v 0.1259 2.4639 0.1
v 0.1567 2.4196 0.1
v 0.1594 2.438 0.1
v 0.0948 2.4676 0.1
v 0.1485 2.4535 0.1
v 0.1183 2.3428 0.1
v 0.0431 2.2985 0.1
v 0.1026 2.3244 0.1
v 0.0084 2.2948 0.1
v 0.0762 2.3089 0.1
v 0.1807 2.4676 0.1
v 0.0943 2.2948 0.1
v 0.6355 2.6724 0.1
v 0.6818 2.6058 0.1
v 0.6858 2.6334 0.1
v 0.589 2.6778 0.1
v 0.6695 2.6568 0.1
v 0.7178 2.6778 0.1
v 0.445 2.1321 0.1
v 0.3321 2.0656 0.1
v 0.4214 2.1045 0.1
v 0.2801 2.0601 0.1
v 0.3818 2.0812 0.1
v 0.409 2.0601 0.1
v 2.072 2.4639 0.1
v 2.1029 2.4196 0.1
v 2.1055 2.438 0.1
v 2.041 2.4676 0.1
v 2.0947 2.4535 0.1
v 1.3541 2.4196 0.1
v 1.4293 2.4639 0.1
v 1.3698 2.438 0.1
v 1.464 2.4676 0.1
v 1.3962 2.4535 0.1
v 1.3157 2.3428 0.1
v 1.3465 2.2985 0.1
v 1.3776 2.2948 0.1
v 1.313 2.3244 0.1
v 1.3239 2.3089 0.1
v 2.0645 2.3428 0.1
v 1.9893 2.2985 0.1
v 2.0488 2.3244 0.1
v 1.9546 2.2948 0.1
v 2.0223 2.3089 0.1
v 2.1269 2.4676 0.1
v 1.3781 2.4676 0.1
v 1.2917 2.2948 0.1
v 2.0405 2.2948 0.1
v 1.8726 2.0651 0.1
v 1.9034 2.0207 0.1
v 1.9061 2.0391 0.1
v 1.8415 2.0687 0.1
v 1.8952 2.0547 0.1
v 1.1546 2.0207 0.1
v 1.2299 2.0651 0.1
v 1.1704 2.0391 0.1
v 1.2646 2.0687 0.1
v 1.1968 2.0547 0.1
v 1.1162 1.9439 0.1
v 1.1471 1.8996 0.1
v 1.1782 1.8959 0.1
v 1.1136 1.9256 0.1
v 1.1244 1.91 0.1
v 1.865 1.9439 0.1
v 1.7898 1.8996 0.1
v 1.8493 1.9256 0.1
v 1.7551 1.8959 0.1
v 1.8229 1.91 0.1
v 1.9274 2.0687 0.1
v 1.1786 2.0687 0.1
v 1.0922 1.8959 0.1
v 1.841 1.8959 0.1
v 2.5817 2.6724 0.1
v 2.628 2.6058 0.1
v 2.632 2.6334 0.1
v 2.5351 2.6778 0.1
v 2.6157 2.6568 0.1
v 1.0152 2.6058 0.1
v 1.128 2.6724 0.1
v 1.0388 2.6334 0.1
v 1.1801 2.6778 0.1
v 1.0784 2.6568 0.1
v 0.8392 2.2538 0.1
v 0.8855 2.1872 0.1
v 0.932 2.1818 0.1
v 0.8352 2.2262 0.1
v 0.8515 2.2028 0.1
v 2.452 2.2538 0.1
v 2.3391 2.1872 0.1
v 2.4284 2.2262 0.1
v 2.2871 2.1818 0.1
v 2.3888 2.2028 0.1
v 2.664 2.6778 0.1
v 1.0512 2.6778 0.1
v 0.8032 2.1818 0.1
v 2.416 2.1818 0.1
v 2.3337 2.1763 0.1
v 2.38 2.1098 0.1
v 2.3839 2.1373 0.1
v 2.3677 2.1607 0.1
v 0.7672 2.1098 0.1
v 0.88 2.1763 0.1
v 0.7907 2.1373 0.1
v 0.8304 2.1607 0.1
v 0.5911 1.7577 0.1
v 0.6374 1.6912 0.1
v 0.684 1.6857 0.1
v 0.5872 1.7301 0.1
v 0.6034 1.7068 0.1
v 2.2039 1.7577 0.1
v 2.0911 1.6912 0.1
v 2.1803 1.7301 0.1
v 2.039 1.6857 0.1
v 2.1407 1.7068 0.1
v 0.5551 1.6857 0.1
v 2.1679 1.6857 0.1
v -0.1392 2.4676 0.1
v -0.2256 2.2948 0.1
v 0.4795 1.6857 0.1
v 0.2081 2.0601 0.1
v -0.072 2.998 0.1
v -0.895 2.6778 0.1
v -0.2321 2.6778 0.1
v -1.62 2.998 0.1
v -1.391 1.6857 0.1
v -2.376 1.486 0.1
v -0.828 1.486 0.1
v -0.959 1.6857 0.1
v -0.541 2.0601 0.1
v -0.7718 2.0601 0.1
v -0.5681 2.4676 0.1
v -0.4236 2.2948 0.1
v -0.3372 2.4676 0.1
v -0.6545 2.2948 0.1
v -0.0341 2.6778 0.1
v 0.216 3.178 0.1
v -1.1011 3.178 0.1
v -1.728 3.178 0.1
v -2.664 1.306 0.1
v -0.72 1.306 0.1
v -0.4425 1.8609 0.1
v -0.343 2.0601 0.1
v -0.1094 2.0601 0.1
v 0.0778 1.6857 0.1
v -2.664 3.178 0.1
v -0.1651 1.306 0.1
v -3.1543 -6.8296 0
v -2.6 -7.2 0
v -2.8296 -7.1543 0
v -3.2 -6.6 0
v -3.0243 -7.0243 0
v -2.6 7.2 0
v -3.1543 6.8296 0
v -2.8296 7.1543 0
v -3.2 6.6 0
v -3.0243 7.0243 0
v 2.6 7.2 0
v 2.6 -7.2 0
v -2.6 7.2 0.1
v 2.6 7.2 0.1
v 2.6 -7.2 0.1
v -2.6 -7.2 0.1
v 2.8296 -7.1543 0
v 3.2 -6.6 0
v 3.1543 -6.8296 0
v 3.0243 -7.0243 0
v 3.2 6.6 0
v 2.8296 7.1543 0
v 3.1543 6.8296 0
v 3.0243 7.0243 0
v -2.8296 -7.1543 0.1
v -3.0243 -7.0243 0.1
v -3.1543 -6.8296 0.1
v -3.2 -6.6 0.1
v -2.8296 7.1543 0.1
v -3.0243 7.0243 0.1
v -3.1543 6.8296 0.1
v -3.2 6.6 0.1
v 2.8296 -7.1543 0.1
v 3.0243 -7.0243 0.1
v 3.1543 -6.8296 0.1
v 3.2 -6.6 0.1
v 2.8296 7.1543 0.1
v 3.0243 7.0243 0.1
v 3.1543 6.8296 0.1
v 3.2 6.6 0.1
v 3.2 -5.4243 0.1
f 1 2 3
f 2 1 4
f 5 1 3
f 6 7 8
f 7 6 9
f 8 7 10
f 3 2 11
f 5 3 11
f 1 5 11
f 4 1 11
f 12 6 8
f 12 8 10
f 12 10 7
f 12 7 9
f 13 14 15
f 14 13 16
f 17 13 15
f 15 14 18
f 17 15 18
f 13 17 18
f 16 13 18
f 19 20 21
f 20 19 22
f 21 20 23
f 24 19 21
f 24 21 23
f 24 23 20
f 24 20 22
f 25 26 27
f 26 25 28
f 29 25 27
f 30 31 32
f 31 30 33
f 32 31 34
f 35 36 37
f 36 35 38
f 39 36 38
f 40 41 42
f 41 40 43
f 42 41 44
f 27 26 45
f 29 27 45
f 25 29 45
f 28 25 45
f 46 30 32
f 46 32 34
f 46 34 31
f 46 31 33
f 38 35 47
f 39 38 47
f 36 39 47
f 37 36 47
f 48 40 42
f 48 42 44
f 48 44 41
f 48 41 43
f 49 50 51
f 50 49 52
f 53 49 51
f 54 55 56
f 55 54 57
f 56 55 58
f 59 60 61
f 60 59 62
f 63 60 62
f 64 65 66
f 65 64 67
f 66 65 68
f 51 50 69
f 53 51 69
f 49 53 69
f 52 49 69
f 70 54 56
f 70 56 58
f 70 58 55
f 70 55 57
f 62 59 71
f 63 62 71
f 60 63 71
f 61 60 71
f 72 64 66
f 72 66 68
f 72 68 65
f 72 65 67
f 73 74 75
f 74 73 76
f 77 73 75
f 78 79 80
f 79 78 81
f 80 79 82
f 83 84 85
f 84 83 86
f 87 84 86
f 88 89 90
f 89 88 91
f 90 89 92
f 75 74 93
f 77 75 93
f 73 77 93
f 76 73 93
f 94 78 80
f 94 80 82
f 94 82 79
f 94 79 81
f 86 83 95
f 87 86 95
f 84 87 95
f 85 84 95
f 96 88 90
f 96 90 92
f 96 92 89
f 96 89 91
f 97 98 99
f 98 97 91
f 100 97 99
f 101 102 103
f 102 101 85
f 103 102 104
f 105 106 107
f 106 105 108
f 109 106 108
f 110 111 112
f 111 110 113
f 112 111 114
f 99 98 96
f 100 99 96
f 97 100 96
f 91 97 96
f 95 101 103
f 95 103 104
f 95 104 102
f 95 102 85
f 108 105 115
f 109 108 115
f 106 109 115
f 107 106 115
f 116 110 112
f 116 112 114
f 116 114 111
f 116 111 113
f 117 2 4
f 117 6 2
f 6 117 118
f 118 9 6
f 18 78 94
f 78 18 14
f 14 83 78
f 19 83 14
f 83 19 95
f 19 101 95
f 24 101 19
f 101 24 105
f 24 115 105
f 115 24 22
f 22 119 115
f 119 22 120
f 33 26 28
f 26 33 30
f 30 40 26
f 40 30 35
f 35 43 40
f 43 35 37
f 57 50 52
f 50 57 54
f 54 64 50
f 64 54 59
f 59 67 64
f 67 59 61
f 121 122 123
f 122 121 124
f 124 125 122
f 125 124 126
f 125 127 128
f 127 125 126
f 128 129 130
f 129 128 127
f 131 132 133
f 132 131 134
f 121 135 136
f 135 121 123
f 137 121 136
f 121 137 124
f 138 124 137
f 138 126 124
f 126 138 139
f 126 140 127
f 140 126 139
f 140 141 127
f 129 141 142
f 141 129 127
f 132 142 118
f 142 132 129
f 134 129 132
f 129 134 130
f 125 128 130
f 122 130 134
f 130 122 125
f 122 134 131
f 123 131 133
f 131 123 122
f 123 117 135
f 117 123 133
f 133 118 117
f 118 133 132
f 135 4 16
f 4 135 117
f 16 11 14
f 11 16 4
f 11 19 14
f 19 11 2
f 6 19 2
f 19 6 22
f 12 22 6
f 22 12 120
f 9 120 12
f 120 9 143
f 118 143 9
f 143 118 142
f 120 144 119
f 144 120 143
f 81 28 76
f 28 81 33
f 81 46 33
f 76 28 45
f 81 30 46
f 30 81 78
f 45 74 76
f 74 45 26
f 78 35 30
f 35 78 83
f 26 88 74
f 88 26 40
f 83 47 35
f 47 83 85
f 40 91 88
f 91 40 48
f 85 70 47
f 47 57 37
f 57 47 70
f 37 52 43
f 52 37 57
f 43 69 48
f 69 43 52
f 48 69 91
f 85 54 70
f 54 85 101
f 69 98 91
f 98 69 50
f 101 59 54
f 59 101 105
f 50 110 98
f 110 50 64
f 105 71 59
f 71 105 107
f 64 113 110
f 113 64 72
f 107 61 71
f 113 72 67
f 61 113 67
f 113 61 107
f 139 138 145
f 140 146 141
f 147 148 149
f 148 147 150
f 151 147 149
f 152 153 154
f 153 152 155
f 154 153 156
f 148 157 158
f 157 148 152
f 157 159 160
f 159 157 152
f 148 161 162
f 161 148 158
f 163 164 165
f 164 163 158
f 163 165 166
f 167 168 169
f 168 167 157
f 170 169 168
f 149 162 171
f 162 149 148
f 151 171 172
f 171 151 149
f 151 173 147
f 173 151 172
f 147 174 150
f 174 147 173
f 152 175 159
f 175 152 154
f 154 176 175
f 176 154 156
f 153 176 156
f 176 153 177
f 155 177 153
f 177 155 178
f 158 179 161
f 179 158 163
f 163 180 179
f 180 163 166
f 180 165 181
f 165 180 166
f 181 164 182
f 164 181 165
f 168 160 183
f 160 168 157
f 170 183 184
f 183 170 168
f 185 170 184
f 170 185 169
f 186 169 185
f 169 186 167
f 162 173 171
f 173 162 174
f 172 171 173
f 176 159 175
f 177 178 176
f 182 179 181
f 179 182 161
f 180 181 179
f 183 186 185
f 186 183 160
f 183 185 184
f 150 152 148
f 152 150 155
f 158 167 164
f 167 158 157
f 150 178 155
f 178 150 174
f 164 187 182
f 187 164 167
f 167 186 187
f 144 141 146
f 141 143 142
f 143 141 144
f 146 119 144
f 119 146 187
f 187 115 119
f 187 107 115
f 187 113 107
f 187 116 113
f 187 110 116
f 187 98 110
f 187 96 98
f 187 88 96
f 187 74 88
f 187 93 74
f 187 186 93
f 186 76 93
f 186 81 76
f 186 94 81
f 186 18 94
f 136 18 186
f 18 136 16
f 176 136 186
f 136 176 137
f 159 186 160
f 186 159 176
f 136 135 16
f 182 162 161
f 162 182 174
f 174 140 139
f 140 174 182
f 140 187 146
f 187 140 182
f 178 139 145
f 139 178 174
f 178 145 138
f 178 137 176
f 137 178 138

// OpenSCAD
// file: ../p/1-4ndis.scad
use <../lib.scad>
function ldraw_lib__1_4ndis() = [
// 0 Disc Negative 0.25
// 0 Name: 1-4ndis.dat
// 0 Author: James Jessiman
// 0 !LDRAW_ORG Primitive UPDATE 2012-01
// 0 !LICENSE Licensed under CC BY 4.0 : see CAreadme.txt
// 
// 0 BFC CERTIFY CCW
  [0,"BFC","CERTIFY"],
  [0,"BFC","CCW"],
// 
// 0 !HISTORY 2002-03-23 [sbliss] Added BFC Statement
// 0 !HISTORY 2002-04-25 [PTadmin] Official Update 2002-02
// 0 !HISTORY 2007-06-22 [PTadmin] Header formatted for Contributor Agreement
// 0 !HISTORY 2008-07-01 [PTadmin] Official Update 2008-01
// 0 !HISTORY 2012-02-16 [Philo] Changed to CCW
// 0 !HISTORY 2012-03-30 [PTadmin] Official Update 2012-01
// 
// 
// 3 16 0.9239 0 0.3827 1 0 0 1 0 1
  [3,16,0.9239,0,0.3827,1,0,0,1,0,1],
// 3 16 0.7071 0 0.7071 0.9239 0 0.3827 1 0 1
  [3,16,0.7071,0,0.7071,0.9239,0,0.3827,1,0,1],
// 3 16 0.3827 0 0.9239 0.7071 0 0.7071 1 0 1
  [3,16,0.3827,0,0.9239,0.7071,0,0.7071,1,0,1],
// 3 16 0 0 1 0.3827 0 0.9239 1 0 1
  [3,16,0,0,1,0.3827,0,0.9239,1,0,1],
];
module ldraw_lib__1_4ndis(step=0, col=false, unit=2/5, alt=false, line=0.2, solid=!$preview)
    makepoly(ldraw_lib__1_4ndis(), step=step, col=col, unit=unit, alt=alt, line=line, solid=solid);
ldraw_lib__1_4ndis(line=0.2);
// file: ../p/box3u12.scad
use <../lib.scad>
function ldraw_lib__box3u12() = [
// 0 Box with 3 Parallel Faces without Any Edges
// 0 Name: box3u12.dat
// 0 Author: J.C. Tchang [tchang]
// 0 !LDRAW_ORG Primitive UPDATE 2014-02
// 0 !LICENSE Licensed under CC BY 4.0 : see CAreadme.txt
// 
// 0 BFC CERTIFY CCW
  [0,"BFC","CERTIFY"],
  [0,"BFC","CCW"],
// 
// 0 !HISTORY 2014-12-23 [PTadmin] Official Update 2014-02
// 
// 
// 4 16 -1 1 1 1 1 1 1 1 -1 -1 1 -1
  [4,16,-1,1,1,1,1,1,1,1,-1,-1,1,-1],
// 4 16 -1 1 1 -1 0 1 1 0 1 1 1 1
  [4,16,-1,1,1,-1,0,1,1,0,1,1,1,1],
// 4 16 1 1 -1 1 0 -1 -1 0 -1 -1 1 -1
  [4,16,1,1,-1,1,0,-1,-1,0,-1,-1,1,-1],
];
module ldraw_lib__box3u12(step=0, col=false, unit=2/5, alt=false, line=0.2, solid=!$preview)
    makepoly(ldraw_lib__box3u12(), step=step, col=col, unit=unit, alt=alt, line=line, solid=solid);
ldraw_lib__box3u12(line=0.2);
// file: ../p/1-8chrd.scad
use <../lib.scad>
function ldraw_lib__1_8chrd() = [
// 0 Chord 0.125
// 0 Name: 1-8chrd.dat
// 0 Author: Orion Pobursky [OrionP]
// 0 !LDRAW_ORG Primitive UPDATE 2023-05
// 0 !LICENSE Licensed under CC BY 4.0 : see CAreadme.txt
// 
// 0 BFC CERTIFY CCW
  [0,"BFC","CERTIFY"],
  [0,"BFC","CCW"],
// 
// 0 !HISTORY 2004-04-22 [PTadmin] Official Update 2004-02
// 0 !HISTORY 2007-06-22 [PTadmin] Header formatted for Contributor Agreement
// 0 !HISTORY 2008-07-01 [PTadmin] Official Update 2008-01
// 0 !HISTORY 2023-10-27 [OrionP] Rebuilt with PrimGen2, original author westrate
// 0 !HISTORY 2023-10-31 [OrionP] Official Update 2023-05
// 
// 3 16 1 0 0 0.9239 0 0.3827 0.7071 0 0.7071
  [3,16,1,0,0,0.9239,0,0.3827,0.7071,0,0.7071],
];
module ldraw_lib__1_8chrd(step=0, col=false, unit=2/5, alt=false, line=0.2, solid=!$preview)
    makepoly(ldraw_lib__1_8chrd(), step=step, col=col, unit=unit, alt=alt, line=line, solid=solid);
ldraw_lib__1_8chrd(line=0.2);
// file: ../p/1-4cyli.scad
use <../lib.scad>
function ldraw_lib__1_4cyli() = [
// 0 Cylinder 0.25
// 0 Name: 1-4cyli.dat
// 0 Author: James Jessiman
// 0 !LDRAW_ORG Primitive UPDATE 2012-01
// 0 !LICENSE Licensed under CC BY 4.0 : see CAreadme.txt
// 
// 0 BFC CERTIFY CCW
  [0,"BFC","CERTIFY"],
  [0,"BFC","CCW"],
// 
// 0 !HISTORY 2002-03-23 [sbliss] Added BFC statement.
// 0 !HISTORY 2002-04-25 [PTadmin] Official Update 2002-02
// 0 !HISTORY 2007-06-22 [PTadmin] Header formatted for Contributor Agreement
// 0 !HISTORY 2008-07-01 [PTadmin] Official Update 2008-01
// 0 !HISTORY 2012-02-16 [Philo] Changed to CCW
// 0 !HISTORY 2012-03-30 [PTadmin] Official Update 2012-01
// 
// 
// 4 16 1 1 0 0.9239 1 0.3827 0.9239 0 0.3827 1 0 0
  [4,16,1,1,0,0.9239,1,0.3827,0.9239,0,0.3827,1,0,0],
// 5 24 1 0 0 1 1 0 0.9239 0 0.3827 1 0 -1
  [5,24,1,0,0,1,1,0,0.9239,0,0.3827,1,0,-1],
// 4 16 0.9239 1 0.3827 0.7071 1 0.7071 0.7071 0 0.7071 0.9239 0 0.3827
  [4,16,0.9239,1,0.3827,0.7071,1,0.7071,0.7071,0,0.7071,0.9239,0,0.3827],
// 5 24 0.9239 0 0.3827 0.9239 1 0.3827 0.7071 0 0.7071 1 0 0
  [5,24,0.9239,0,0.3827,0.9239,1,0.3827,0.7071,0,0.7071,1,0,0],
// 4 16 0.7071 1 0.7071 0.3827 1 0.9239 0.3827 0 0.9239 0.7071 0 0.7071
  [4,16,0.7071,1,0.7071,0.3827,1,0.9239,0.3827,0,0.9239,0.7071,0,0.7071],
// 5 24 0.7071 0 0.7071 0.7071 1 0.7071 0.3827 0 0.9239 0.9239 0 0.3827
  [5,24,0.7071,0,0.7071,0.7071,1,0.7071,0.3827,0,0.9239,0.9239,0,0.3827],
// 4 16 0.3827 1 0.9239 0 1 1 0 0 1 0.3827 0 0.9239
  [4,16,0.3827,1,0.9239,0,1,1,0,0,1,0.3827,0,0.9239],
// 5 24 0.3827 0 0.9239 0.3827 1 0.9239 0 0 1 0.7071 0 0.7071
  [5,24,0.3827,0,0.9239,0.3827,1,0.9239,0,0,1,0.7071,0,0.7071],
// 5 24 0 0 1 0 1 1 0.3827 0 0.9239 -1 0 1
  [5,24,0,0,1,0,1,1,0.3827,0,0.9239,-1,0,1],
];
module ldraw_lib__1_4cyli(step=0, col=false, unit=2/5, alt=false, line=0.2, solid=!$preview)
    makepoly(ldraw_lib__1_4cyli(), step=step, col=col, unit=unit, alt=alt, line=line, solid=solid);
ldraw_lib__1_4cyli(line=0.2);
// file: ../p/1-4chrd.scad
use <../lib.scad>
function ldraw_lib__1_4chrd() = [
// 0 Chord 0.25
// 0 Name: 1-4chrd.dat
// 0 Author: Max Martin Richter [MMR1988]
// 0 !LDRAW_ORG Primitive UPDATE 2023-05
// 0 !LICENSE Licensed under CC BY 4.0 : see CAreadme.txt
// 
// 0 BFC CERTIFY CCW
  [0,"BFC","CERTIFY"],
  [0,"BFC","CCW"],
// 
// 0 !HISTORY 2004-04-22 [PTadmin] Official Update 2004-02
// 0 !HISTORY 2007-10-09 [PTadmin] Header formatted for Contributor Agreement
// 0 !HISTORY 2008-07-01 [PTadmin] Official Update 2008-01
// 0 !HISTORY 2012-08-02 [MMR1988] Re-creation with PrimGen2 and Rectifier
// 0 !HISTORY 2012-08-09 [PTadmin] Official Update 2012-02
// 0 !HISTORY 2023-10-27 [OrionP] Change author to MMR1988 from hafhead
// 0 !HISTORY 2023-10-31 [OrionP] Official Update 2023-05
// 
// 4 16 0.9239 0 0.3827 0.3827 0 0.9239 0 0 1 1 0 0
  [4,16,0.9239,0,0.3827,0.3827,0,0.9239,0,0,1,1,0,0],
// 3 16 0.7071 0 0.7071 0.3827 0 0.9239 0.9239 0 0.3827
  [3,16,0.7071,0,0.7071,0.3827,0,0.9239,0.9239,0,0.3827],
];
module ldraw_lib__1_4chrd(step=0, col=false, unit=2/5, alt=false, line=0.2, solid=!$preview)
    makepoly(ldraw_lib__1_4chrd(), step=step, col=col, unit=unit, alt=alt, line=line, solid=solid);
ldraw_lib__1_4chrd(line=0.2);
// main file
use <../lib.scad>
use <../p/1-4chrd.scad>
use <../p/1-4cyli.scad>
use <../p/1-8chrd.scad>
use <../p/box3u12.scad>
use <s/6142271hs01.scad>
function ldraw_lib__6142271k() = [
// 0 Sticker  1.8 x  0.8 with R8 Logo on Black and White Background Right
// 0 Name: 6142271k.dat
// 0 Author: Massimo Maso [Sirio]
// 0 !LDRAW_ORG Part UPDATE 2026-07
// 0 !LICENSE Licensed under CC BY 4.0 : see CAreadme.txt
// 
// 0 BFC CERTIFY CCW
  [0,"BFC","CERTIFY"],
  [0,"BFC","CCW"],
// 
// 0 !CATEGORY Sticker
// 0 !KEYWORDS Audi, Bricklink 75873stk01a, Brickowl 427960, LMS, Rebrickable 24755
// 0 !KEYWORDS Set 75873, Speed Champions, Ultra
// 
// 0 !HISTORY 2025-05-28 [OrionP] Official Update 2025-05
// 0 !HISTORY 2026-07-18 [MagFors] Update description
// 0 !HISTORY 2026-07-30 [OrionP] Official Update 2026-07
// 
// 0 // Subparts
// 1 15 0 -.25 5.605 1 0 0 0 1 0 0 0 1 s\6142271hs01.dat
  [1,15,0,-.25,5.605,1,0,0,0,1,0,0,0,1, ldraw_lib__s__6142271hs01()],
// 0 // Primitives
// 1 16 -6.5 0 -16.5 0 0 -1.5 0 -1 0 -1.5 0 0 1-4chrd.dat
  [1,16,-6.5,0,-16.5,0,0,-1.5,0,-1,0,-1.5,0,0, ldraw_lib__1_4chrd()],
// 1 16 -6.5 0 16.5 0 0 -1.5 0 -1 0 1.5 0 0 1-4chrd.dat
  [1,16,-6.5,0,16.5,0,0,-1.5,0,-1,0,1.5,0,0, ldraw_lib__1_4chrd()],
// 1 16 0 -.25 0 -6.5 0 0 0 .25 0 0 0 18 box3u12.dat
  [1,16,0,-.25,0,-6.5,0,0,0,.25,0,0,0,18, ldraw_lib__box3u12()],
// 1 16 6.5 0 -16.5 0 0 1.5 0 -1 0 -1.5 0 0 1-4chrd.dat
  [1,16,6.5,0,-16.5,0,0,1.5,0,-1,0,-1.5,0,0, ldraw_lib__1_4chrd()],
// 1 16 6.5 0 16.5 0 0 1.5 0 -1 0 1.5 0 0 1-4chrd.dat
  [1,16,6.5,0,16.5,0,0,1.5,0,-1,0,1.5,0,0, ldraw_lib__1_4chrd()],
// 1 16 -6.5 0 -16.5 0 0 -1.5 0 -.25 0 -1.5 0 0 1-4cyli.dat
  [1,16,-6.5,0,-16.5,0,0,-1.5,0,-.25,0,-1.5,0,0, ldraw_lib__1_4cyli()],
// 1 16 -6.5 0 16.5 0 0 -1.5 0 -.25 0 1.5 0 0 1-4cyli.dat
  [1,16,-6.5,0,16.5,0,0,-1.5,0,-.25,0,1.5,0,0, ldraw_lib__1_4cyli()],
// 1 16 6.5 0 -16.5 0 0 1.5 0 -.25 0 -1.5 0 0 1-4cyli.dat
  [1,16,6.5,0,-16.5,0,0,1.5,0,-.25,0,-1.5,0,0, ldraw_lib__1_4cyli()],
// 1 16 6.5 0 16.5 0 0 1.5 0 -.25 0 1.5 0 0 1-4cyli.dat
  [1,16,6.5,0,16.5,0,0,1.5,0,-.25,0,1.5,0,0, ldraw_lib__1_4cyli()],
// 1 15 -6.5 -.25 -16.5 -1.5 0 0 0 1 0 0 0 -1.5 1-4chrd.dat
  [1,15,-6.5,-.25,-16.5,-1.5,0,0,0,1,0,0,0,-1.5, ldraw_lib__1_4chrd()],
// 1 0 -6.5 -.25 16.5 0 0 -1.5 0 1 0 1.5 0 0 1-8chrd.dat
  [1,0,-6.5,-.25,16.5,0,0,-1.5,0,1,0,1.5,0,0, ldraw_lib__1_8chrd()],
// 1 15 -6.5 -.25 16.5 -1.5 0 0 0 1 0 0 0 1.5 1-8chrd.dat
  [1,15,-6.5,-.25,16.5,-1.5,0,0,0,1,0,0,0,1.5, ldraw_lib__1_8chrd()],
// 1 15 6.5 -.25 -16.5 0 0 1.5 0 1 0 -1.5 0 0 1-4chrd.dat
  [1,15,6.5,-.25,-16.5,0,0,1.5,0,1,0,-1.5,0,0, ldraw_lib__1_4chrd()],
// 1 0 6.5 -.25 16.5 0 0 1.5 0 1 0 1.5 0 0 1-4chrd.dat
  [1,0,6.5,-.25,16.5,0,0,1.5,0,1,0,1.5,0,0, ldraw_lib__1_4chrd()],
// 0 // Bottom faces
// 4 16 -8 0 16.5 -6.5 0 18 -6.5 0 -18 -8 0 -16.5
  [4,16,-8,0,16.5,-6.5,0,18,-6.5,0,-18,-8,0,-16.5],
// 4 16 8 0 16.5 8 0 -16.5 6.5 0 -18 6.5 0 18
  [4,16,8,0,16.5,8,0,-16.5,6.5,0,-18,6.5,0,18],
// 0 // Lateral faces
// 4 16 -8 0 -16.5 -8 -.25 -16.5 -8 -.25 16.5 -8 0 16.5
  [4,16,-8,0,-16.5,-8,-.25,-16.5,-8,-.25,16.5,-8,0,16.5],
// 4 16 8 0 -16.5 8 0 16.5 8 -.25 -13.5608 8 -.25 -16.5
  [4,16,8,0,-16.5,8,0,16.5,8,-.25,-13.5608,8,-.25,-16.5],
// 3 16 8 0 16.5 8 -.25 16.5 8 -.25 -13.5608
  [3,16,8,0,16.5,8,-.25,16.5,8,-.25,-13.5608],
// 0 // Black top faces
// 3 0 .1944 -.25 4.2142 -1.10635 -.25 4.6523 -.4127 -.25 3.265
  [3,0,.1944,-.25,4.2142,-1.10635,-.25,4.6523,-.4127,-.25,3.265],
// 4 0 .1944 -.25 4.2142 -.2736 -.25 5.1502 -.8574 -.25 5.1502 -1.10635 -.25 4.6523
  [4,0,.1944,-.25,4.2142,-.2736,-.25,5.1502,-.8574,-.25,5.1502,-1.10635,-.25,4.6523],
// 4 0 8 -.25 -13.5608 1.1988 -.25 4.2142 .1944 -.25 4.2142 -.4127 -.25 3.265
  [4,0,8,-.25,-13.5608,1.1988,-.25,4.2142,.1944,-.25,4.2142,-.4127,-.25,3.265],
// 3 0 8 -.25 -13.5608 1.3878 -.25 4.2142 1.1988 -.25 4.2142
  [3,0,8,-.25,-13.5608,1.3878,-.25,4.2142,1.1988,-.25,4.2142],
// 3 0 8 -.25 -13.5608 1.71 -.25 4.2142 1.3878 -.25 4.2142
  [3,0,8,-.25,-13.5608,1.71,-.25,4.2142,1.3878,-.25,4.2142],
// 3 0 8 -.25 -13.5608 5.0976 -.25 4.2142 1.71 -.25 4.2142
  [3,0,8,-.25,-13.5608,5.0976,-.25,4.2142,1.71,-.25,4.2142],
// 3 0 8 -.25 -13.5608 5.4198 -.25 4.2142 5.0976 -.25 4.2142
  [3,0,8,-.25,-13.5608,5.4198,-.25,4.2142,5.0976,-.25,4.2142],
// 3 0 8 -.25 -13.5608 5.5098 -.25 4.3942 5.4198 -.25 4.2142
  [3,0,8,-.25,-13.5608,5.5098,-.25,4.3942,5.4198,-.25,4.2142],
// 3 0 8 -.25 -13.5608 5.9499 -.25 5.2744 5.5098 -.25 4.3942
  [3,0,8,-.25,-13.5608,5.9499,-.25,5.2744,5.5098,-.25,4.3942],
// 3 0 8 -.25 -13.5608 6.0399 -.25 5.4544 5.9499 -.25 5.2744
  [3,0,8,-.25,-13.5608,6.0399,-.25,5.4544,5.9499,-.25,5.2744],
// 3 0 8 -.25 -13.5608 6.1299 -.25 5.6344 6.0399 -.25 5.4544
  [3,0,8,-.25,-13.5608,6.1299,-.25,5.6344,6.0399,-.25,5.4544],
// 3 0 8 -.25 -13.5608 6.57 -.25 6.5146 6.1299 -.25 5.6344
  [3,0,8,-.25,-13.5608,6.57,-.25,6.5146,6.1299,-.25,5.6344],
// 3 0 8 -.25 -13.5608 6.66 -.25 6.6946 6.57 -.25 6.5146
  [3,0,8,-.25,-13.5608,6.66,-.25,6.6946,6.57,-.25,6.5146],
// 3 0 8 -.25 -13.5608 8 -.25 16.5 6.66 -.25 6.6946
  [3,0,8,-.25,-13.5608,8,-.25,16.5,6.66,-.25,6.6946],
// 3 0 8 -.25 16.5 6.3378 -.25 6.6946 6.66 -.25 6.6946
  [3,0,8,-.25,16.5,6.3378,-.25,6.6946,6.66,-.25,6.6946],
// 3 0 8 -.25 16.5 2.9502 -.25 6.6946 6.3378 -.25 6.6946
  [3,0,8,-.25,16.5,2.9502,-.25,6.6946,6.3378,-.25,6.6946],
// 3 0 8 -.25 16.5 2.628 -.25 6.6946 2.9502 -.25 6.6946
  [3,0,8,-.25,16.5,2.628,-.25,6.6946,2.9502,-.25,6.6946],
// 3 0 8 -.25 16.5 1.7946 -.25 6.6946 2.628 -.25 6.6946
  [3,0,8,-.25,16.5,1.7946,-.25,6.6946,2.628,-.25,6.6946],
// 4 0 8 -.25 16.5 .54 -.25 7.945 1.4724 -.25 6.6946 1.7946 -.25 6.6946
  [4,0,8,-.25,16.5,.54,-.25,7.945,1.4724,-.25,6.6946,1.7946,-.25,6.6946],
// 4 0 8 -.25 16.5 -7.5607 -.25 17.5607 -2.7527 -.25 7.945 .54 -.25 7.945
  [4,0,8,-.25,16.5,-7.5607,-.25,17.5607,-2.7527,-.25,7.945,.54,-.25,7.945],
// 4 0 8 -.25 16.5 6.5 -.25 18 -6.5 -.25 18 -7.5607 -.25 17.5607
  [4,0,8,-.25,16.5,6.5,-.25,18,-6.5,-.25,18,-7.5607,-.25,17.5607],
// 3 0 .54 -.25 7.945 -.0852 -.25 6.6946 1.4724 -.25 6.6946
  [3,0,.54,-.25,7.945,-.0852,-.25,6.6946,1.4724,-.25,6.6946],
// 0 // White top faces
// 4 15 8 -.25 -16.5 -8 -.25 -16.5 -6.5 -.25 -18 6.5 -.25 -18
  [4,15,8,-.25,-16.5,-8,-.25,-16.5,-6.5,-.25,-18,6.5,-.25,-18],
// 4 15 -8 -.25 -16.5 8 -.25 -16.5 -1.8 -.25 3.265 -6.66 -.25 3.265
  [4,15,-8,-.25,-16.5,8,-.25,-16.5,-1.8,-.25,3.265,-6.66,-.25,3.265],
// 4 15 8 -.25 -16.5 8 -.25 -13.5608 -.4127 -.25 3.265 -1.8 -.25 3.265
  [4,15,8,-.25,-16.5,8,-.25,-13.5608,-.4127,-.25,3.265,-1.8,-.25,3.265],
// 4 15 -8 -.25 16.5 -8 -.25 -16.5 -6.66 -.25 3.265 -6.66 -.25 7.945
  [4,15,-8,-.25,16.5,-8,-.25,-16.5,-6.66,-.25,3.265,-6.66,-.25,7.945],
// 3 15 -8 -.25 16.5 -6.66 -.25 7.945 -4.32 -.25 7.945
  [3,15,-8,-.25,16.5,-6.66,-.25,7.945,-4.32,-.25,7.945],
// 4 15 -8 -.25 16.5 -4.32 -.25 7.945 -2.7527 -.25 7.945 -7.5607 -.25 17.5607
  [4,15,-8,-.25,16.5,-4.32,-.25,7.945,-2.7527,-.25,7.945,-7.5607,-.25,17.5607],
];
module ldraw_lib__6142271k(step=0, col=false, unit=2/5, alt=false, line=0.2, solid=!$preview)
    makepoly(ldraw_lib__6142271k(), step=step, col=col, unit=unit, alt=alt, line=line, solid=solid);
ldraw_lib__6142271k(line=0.2);
